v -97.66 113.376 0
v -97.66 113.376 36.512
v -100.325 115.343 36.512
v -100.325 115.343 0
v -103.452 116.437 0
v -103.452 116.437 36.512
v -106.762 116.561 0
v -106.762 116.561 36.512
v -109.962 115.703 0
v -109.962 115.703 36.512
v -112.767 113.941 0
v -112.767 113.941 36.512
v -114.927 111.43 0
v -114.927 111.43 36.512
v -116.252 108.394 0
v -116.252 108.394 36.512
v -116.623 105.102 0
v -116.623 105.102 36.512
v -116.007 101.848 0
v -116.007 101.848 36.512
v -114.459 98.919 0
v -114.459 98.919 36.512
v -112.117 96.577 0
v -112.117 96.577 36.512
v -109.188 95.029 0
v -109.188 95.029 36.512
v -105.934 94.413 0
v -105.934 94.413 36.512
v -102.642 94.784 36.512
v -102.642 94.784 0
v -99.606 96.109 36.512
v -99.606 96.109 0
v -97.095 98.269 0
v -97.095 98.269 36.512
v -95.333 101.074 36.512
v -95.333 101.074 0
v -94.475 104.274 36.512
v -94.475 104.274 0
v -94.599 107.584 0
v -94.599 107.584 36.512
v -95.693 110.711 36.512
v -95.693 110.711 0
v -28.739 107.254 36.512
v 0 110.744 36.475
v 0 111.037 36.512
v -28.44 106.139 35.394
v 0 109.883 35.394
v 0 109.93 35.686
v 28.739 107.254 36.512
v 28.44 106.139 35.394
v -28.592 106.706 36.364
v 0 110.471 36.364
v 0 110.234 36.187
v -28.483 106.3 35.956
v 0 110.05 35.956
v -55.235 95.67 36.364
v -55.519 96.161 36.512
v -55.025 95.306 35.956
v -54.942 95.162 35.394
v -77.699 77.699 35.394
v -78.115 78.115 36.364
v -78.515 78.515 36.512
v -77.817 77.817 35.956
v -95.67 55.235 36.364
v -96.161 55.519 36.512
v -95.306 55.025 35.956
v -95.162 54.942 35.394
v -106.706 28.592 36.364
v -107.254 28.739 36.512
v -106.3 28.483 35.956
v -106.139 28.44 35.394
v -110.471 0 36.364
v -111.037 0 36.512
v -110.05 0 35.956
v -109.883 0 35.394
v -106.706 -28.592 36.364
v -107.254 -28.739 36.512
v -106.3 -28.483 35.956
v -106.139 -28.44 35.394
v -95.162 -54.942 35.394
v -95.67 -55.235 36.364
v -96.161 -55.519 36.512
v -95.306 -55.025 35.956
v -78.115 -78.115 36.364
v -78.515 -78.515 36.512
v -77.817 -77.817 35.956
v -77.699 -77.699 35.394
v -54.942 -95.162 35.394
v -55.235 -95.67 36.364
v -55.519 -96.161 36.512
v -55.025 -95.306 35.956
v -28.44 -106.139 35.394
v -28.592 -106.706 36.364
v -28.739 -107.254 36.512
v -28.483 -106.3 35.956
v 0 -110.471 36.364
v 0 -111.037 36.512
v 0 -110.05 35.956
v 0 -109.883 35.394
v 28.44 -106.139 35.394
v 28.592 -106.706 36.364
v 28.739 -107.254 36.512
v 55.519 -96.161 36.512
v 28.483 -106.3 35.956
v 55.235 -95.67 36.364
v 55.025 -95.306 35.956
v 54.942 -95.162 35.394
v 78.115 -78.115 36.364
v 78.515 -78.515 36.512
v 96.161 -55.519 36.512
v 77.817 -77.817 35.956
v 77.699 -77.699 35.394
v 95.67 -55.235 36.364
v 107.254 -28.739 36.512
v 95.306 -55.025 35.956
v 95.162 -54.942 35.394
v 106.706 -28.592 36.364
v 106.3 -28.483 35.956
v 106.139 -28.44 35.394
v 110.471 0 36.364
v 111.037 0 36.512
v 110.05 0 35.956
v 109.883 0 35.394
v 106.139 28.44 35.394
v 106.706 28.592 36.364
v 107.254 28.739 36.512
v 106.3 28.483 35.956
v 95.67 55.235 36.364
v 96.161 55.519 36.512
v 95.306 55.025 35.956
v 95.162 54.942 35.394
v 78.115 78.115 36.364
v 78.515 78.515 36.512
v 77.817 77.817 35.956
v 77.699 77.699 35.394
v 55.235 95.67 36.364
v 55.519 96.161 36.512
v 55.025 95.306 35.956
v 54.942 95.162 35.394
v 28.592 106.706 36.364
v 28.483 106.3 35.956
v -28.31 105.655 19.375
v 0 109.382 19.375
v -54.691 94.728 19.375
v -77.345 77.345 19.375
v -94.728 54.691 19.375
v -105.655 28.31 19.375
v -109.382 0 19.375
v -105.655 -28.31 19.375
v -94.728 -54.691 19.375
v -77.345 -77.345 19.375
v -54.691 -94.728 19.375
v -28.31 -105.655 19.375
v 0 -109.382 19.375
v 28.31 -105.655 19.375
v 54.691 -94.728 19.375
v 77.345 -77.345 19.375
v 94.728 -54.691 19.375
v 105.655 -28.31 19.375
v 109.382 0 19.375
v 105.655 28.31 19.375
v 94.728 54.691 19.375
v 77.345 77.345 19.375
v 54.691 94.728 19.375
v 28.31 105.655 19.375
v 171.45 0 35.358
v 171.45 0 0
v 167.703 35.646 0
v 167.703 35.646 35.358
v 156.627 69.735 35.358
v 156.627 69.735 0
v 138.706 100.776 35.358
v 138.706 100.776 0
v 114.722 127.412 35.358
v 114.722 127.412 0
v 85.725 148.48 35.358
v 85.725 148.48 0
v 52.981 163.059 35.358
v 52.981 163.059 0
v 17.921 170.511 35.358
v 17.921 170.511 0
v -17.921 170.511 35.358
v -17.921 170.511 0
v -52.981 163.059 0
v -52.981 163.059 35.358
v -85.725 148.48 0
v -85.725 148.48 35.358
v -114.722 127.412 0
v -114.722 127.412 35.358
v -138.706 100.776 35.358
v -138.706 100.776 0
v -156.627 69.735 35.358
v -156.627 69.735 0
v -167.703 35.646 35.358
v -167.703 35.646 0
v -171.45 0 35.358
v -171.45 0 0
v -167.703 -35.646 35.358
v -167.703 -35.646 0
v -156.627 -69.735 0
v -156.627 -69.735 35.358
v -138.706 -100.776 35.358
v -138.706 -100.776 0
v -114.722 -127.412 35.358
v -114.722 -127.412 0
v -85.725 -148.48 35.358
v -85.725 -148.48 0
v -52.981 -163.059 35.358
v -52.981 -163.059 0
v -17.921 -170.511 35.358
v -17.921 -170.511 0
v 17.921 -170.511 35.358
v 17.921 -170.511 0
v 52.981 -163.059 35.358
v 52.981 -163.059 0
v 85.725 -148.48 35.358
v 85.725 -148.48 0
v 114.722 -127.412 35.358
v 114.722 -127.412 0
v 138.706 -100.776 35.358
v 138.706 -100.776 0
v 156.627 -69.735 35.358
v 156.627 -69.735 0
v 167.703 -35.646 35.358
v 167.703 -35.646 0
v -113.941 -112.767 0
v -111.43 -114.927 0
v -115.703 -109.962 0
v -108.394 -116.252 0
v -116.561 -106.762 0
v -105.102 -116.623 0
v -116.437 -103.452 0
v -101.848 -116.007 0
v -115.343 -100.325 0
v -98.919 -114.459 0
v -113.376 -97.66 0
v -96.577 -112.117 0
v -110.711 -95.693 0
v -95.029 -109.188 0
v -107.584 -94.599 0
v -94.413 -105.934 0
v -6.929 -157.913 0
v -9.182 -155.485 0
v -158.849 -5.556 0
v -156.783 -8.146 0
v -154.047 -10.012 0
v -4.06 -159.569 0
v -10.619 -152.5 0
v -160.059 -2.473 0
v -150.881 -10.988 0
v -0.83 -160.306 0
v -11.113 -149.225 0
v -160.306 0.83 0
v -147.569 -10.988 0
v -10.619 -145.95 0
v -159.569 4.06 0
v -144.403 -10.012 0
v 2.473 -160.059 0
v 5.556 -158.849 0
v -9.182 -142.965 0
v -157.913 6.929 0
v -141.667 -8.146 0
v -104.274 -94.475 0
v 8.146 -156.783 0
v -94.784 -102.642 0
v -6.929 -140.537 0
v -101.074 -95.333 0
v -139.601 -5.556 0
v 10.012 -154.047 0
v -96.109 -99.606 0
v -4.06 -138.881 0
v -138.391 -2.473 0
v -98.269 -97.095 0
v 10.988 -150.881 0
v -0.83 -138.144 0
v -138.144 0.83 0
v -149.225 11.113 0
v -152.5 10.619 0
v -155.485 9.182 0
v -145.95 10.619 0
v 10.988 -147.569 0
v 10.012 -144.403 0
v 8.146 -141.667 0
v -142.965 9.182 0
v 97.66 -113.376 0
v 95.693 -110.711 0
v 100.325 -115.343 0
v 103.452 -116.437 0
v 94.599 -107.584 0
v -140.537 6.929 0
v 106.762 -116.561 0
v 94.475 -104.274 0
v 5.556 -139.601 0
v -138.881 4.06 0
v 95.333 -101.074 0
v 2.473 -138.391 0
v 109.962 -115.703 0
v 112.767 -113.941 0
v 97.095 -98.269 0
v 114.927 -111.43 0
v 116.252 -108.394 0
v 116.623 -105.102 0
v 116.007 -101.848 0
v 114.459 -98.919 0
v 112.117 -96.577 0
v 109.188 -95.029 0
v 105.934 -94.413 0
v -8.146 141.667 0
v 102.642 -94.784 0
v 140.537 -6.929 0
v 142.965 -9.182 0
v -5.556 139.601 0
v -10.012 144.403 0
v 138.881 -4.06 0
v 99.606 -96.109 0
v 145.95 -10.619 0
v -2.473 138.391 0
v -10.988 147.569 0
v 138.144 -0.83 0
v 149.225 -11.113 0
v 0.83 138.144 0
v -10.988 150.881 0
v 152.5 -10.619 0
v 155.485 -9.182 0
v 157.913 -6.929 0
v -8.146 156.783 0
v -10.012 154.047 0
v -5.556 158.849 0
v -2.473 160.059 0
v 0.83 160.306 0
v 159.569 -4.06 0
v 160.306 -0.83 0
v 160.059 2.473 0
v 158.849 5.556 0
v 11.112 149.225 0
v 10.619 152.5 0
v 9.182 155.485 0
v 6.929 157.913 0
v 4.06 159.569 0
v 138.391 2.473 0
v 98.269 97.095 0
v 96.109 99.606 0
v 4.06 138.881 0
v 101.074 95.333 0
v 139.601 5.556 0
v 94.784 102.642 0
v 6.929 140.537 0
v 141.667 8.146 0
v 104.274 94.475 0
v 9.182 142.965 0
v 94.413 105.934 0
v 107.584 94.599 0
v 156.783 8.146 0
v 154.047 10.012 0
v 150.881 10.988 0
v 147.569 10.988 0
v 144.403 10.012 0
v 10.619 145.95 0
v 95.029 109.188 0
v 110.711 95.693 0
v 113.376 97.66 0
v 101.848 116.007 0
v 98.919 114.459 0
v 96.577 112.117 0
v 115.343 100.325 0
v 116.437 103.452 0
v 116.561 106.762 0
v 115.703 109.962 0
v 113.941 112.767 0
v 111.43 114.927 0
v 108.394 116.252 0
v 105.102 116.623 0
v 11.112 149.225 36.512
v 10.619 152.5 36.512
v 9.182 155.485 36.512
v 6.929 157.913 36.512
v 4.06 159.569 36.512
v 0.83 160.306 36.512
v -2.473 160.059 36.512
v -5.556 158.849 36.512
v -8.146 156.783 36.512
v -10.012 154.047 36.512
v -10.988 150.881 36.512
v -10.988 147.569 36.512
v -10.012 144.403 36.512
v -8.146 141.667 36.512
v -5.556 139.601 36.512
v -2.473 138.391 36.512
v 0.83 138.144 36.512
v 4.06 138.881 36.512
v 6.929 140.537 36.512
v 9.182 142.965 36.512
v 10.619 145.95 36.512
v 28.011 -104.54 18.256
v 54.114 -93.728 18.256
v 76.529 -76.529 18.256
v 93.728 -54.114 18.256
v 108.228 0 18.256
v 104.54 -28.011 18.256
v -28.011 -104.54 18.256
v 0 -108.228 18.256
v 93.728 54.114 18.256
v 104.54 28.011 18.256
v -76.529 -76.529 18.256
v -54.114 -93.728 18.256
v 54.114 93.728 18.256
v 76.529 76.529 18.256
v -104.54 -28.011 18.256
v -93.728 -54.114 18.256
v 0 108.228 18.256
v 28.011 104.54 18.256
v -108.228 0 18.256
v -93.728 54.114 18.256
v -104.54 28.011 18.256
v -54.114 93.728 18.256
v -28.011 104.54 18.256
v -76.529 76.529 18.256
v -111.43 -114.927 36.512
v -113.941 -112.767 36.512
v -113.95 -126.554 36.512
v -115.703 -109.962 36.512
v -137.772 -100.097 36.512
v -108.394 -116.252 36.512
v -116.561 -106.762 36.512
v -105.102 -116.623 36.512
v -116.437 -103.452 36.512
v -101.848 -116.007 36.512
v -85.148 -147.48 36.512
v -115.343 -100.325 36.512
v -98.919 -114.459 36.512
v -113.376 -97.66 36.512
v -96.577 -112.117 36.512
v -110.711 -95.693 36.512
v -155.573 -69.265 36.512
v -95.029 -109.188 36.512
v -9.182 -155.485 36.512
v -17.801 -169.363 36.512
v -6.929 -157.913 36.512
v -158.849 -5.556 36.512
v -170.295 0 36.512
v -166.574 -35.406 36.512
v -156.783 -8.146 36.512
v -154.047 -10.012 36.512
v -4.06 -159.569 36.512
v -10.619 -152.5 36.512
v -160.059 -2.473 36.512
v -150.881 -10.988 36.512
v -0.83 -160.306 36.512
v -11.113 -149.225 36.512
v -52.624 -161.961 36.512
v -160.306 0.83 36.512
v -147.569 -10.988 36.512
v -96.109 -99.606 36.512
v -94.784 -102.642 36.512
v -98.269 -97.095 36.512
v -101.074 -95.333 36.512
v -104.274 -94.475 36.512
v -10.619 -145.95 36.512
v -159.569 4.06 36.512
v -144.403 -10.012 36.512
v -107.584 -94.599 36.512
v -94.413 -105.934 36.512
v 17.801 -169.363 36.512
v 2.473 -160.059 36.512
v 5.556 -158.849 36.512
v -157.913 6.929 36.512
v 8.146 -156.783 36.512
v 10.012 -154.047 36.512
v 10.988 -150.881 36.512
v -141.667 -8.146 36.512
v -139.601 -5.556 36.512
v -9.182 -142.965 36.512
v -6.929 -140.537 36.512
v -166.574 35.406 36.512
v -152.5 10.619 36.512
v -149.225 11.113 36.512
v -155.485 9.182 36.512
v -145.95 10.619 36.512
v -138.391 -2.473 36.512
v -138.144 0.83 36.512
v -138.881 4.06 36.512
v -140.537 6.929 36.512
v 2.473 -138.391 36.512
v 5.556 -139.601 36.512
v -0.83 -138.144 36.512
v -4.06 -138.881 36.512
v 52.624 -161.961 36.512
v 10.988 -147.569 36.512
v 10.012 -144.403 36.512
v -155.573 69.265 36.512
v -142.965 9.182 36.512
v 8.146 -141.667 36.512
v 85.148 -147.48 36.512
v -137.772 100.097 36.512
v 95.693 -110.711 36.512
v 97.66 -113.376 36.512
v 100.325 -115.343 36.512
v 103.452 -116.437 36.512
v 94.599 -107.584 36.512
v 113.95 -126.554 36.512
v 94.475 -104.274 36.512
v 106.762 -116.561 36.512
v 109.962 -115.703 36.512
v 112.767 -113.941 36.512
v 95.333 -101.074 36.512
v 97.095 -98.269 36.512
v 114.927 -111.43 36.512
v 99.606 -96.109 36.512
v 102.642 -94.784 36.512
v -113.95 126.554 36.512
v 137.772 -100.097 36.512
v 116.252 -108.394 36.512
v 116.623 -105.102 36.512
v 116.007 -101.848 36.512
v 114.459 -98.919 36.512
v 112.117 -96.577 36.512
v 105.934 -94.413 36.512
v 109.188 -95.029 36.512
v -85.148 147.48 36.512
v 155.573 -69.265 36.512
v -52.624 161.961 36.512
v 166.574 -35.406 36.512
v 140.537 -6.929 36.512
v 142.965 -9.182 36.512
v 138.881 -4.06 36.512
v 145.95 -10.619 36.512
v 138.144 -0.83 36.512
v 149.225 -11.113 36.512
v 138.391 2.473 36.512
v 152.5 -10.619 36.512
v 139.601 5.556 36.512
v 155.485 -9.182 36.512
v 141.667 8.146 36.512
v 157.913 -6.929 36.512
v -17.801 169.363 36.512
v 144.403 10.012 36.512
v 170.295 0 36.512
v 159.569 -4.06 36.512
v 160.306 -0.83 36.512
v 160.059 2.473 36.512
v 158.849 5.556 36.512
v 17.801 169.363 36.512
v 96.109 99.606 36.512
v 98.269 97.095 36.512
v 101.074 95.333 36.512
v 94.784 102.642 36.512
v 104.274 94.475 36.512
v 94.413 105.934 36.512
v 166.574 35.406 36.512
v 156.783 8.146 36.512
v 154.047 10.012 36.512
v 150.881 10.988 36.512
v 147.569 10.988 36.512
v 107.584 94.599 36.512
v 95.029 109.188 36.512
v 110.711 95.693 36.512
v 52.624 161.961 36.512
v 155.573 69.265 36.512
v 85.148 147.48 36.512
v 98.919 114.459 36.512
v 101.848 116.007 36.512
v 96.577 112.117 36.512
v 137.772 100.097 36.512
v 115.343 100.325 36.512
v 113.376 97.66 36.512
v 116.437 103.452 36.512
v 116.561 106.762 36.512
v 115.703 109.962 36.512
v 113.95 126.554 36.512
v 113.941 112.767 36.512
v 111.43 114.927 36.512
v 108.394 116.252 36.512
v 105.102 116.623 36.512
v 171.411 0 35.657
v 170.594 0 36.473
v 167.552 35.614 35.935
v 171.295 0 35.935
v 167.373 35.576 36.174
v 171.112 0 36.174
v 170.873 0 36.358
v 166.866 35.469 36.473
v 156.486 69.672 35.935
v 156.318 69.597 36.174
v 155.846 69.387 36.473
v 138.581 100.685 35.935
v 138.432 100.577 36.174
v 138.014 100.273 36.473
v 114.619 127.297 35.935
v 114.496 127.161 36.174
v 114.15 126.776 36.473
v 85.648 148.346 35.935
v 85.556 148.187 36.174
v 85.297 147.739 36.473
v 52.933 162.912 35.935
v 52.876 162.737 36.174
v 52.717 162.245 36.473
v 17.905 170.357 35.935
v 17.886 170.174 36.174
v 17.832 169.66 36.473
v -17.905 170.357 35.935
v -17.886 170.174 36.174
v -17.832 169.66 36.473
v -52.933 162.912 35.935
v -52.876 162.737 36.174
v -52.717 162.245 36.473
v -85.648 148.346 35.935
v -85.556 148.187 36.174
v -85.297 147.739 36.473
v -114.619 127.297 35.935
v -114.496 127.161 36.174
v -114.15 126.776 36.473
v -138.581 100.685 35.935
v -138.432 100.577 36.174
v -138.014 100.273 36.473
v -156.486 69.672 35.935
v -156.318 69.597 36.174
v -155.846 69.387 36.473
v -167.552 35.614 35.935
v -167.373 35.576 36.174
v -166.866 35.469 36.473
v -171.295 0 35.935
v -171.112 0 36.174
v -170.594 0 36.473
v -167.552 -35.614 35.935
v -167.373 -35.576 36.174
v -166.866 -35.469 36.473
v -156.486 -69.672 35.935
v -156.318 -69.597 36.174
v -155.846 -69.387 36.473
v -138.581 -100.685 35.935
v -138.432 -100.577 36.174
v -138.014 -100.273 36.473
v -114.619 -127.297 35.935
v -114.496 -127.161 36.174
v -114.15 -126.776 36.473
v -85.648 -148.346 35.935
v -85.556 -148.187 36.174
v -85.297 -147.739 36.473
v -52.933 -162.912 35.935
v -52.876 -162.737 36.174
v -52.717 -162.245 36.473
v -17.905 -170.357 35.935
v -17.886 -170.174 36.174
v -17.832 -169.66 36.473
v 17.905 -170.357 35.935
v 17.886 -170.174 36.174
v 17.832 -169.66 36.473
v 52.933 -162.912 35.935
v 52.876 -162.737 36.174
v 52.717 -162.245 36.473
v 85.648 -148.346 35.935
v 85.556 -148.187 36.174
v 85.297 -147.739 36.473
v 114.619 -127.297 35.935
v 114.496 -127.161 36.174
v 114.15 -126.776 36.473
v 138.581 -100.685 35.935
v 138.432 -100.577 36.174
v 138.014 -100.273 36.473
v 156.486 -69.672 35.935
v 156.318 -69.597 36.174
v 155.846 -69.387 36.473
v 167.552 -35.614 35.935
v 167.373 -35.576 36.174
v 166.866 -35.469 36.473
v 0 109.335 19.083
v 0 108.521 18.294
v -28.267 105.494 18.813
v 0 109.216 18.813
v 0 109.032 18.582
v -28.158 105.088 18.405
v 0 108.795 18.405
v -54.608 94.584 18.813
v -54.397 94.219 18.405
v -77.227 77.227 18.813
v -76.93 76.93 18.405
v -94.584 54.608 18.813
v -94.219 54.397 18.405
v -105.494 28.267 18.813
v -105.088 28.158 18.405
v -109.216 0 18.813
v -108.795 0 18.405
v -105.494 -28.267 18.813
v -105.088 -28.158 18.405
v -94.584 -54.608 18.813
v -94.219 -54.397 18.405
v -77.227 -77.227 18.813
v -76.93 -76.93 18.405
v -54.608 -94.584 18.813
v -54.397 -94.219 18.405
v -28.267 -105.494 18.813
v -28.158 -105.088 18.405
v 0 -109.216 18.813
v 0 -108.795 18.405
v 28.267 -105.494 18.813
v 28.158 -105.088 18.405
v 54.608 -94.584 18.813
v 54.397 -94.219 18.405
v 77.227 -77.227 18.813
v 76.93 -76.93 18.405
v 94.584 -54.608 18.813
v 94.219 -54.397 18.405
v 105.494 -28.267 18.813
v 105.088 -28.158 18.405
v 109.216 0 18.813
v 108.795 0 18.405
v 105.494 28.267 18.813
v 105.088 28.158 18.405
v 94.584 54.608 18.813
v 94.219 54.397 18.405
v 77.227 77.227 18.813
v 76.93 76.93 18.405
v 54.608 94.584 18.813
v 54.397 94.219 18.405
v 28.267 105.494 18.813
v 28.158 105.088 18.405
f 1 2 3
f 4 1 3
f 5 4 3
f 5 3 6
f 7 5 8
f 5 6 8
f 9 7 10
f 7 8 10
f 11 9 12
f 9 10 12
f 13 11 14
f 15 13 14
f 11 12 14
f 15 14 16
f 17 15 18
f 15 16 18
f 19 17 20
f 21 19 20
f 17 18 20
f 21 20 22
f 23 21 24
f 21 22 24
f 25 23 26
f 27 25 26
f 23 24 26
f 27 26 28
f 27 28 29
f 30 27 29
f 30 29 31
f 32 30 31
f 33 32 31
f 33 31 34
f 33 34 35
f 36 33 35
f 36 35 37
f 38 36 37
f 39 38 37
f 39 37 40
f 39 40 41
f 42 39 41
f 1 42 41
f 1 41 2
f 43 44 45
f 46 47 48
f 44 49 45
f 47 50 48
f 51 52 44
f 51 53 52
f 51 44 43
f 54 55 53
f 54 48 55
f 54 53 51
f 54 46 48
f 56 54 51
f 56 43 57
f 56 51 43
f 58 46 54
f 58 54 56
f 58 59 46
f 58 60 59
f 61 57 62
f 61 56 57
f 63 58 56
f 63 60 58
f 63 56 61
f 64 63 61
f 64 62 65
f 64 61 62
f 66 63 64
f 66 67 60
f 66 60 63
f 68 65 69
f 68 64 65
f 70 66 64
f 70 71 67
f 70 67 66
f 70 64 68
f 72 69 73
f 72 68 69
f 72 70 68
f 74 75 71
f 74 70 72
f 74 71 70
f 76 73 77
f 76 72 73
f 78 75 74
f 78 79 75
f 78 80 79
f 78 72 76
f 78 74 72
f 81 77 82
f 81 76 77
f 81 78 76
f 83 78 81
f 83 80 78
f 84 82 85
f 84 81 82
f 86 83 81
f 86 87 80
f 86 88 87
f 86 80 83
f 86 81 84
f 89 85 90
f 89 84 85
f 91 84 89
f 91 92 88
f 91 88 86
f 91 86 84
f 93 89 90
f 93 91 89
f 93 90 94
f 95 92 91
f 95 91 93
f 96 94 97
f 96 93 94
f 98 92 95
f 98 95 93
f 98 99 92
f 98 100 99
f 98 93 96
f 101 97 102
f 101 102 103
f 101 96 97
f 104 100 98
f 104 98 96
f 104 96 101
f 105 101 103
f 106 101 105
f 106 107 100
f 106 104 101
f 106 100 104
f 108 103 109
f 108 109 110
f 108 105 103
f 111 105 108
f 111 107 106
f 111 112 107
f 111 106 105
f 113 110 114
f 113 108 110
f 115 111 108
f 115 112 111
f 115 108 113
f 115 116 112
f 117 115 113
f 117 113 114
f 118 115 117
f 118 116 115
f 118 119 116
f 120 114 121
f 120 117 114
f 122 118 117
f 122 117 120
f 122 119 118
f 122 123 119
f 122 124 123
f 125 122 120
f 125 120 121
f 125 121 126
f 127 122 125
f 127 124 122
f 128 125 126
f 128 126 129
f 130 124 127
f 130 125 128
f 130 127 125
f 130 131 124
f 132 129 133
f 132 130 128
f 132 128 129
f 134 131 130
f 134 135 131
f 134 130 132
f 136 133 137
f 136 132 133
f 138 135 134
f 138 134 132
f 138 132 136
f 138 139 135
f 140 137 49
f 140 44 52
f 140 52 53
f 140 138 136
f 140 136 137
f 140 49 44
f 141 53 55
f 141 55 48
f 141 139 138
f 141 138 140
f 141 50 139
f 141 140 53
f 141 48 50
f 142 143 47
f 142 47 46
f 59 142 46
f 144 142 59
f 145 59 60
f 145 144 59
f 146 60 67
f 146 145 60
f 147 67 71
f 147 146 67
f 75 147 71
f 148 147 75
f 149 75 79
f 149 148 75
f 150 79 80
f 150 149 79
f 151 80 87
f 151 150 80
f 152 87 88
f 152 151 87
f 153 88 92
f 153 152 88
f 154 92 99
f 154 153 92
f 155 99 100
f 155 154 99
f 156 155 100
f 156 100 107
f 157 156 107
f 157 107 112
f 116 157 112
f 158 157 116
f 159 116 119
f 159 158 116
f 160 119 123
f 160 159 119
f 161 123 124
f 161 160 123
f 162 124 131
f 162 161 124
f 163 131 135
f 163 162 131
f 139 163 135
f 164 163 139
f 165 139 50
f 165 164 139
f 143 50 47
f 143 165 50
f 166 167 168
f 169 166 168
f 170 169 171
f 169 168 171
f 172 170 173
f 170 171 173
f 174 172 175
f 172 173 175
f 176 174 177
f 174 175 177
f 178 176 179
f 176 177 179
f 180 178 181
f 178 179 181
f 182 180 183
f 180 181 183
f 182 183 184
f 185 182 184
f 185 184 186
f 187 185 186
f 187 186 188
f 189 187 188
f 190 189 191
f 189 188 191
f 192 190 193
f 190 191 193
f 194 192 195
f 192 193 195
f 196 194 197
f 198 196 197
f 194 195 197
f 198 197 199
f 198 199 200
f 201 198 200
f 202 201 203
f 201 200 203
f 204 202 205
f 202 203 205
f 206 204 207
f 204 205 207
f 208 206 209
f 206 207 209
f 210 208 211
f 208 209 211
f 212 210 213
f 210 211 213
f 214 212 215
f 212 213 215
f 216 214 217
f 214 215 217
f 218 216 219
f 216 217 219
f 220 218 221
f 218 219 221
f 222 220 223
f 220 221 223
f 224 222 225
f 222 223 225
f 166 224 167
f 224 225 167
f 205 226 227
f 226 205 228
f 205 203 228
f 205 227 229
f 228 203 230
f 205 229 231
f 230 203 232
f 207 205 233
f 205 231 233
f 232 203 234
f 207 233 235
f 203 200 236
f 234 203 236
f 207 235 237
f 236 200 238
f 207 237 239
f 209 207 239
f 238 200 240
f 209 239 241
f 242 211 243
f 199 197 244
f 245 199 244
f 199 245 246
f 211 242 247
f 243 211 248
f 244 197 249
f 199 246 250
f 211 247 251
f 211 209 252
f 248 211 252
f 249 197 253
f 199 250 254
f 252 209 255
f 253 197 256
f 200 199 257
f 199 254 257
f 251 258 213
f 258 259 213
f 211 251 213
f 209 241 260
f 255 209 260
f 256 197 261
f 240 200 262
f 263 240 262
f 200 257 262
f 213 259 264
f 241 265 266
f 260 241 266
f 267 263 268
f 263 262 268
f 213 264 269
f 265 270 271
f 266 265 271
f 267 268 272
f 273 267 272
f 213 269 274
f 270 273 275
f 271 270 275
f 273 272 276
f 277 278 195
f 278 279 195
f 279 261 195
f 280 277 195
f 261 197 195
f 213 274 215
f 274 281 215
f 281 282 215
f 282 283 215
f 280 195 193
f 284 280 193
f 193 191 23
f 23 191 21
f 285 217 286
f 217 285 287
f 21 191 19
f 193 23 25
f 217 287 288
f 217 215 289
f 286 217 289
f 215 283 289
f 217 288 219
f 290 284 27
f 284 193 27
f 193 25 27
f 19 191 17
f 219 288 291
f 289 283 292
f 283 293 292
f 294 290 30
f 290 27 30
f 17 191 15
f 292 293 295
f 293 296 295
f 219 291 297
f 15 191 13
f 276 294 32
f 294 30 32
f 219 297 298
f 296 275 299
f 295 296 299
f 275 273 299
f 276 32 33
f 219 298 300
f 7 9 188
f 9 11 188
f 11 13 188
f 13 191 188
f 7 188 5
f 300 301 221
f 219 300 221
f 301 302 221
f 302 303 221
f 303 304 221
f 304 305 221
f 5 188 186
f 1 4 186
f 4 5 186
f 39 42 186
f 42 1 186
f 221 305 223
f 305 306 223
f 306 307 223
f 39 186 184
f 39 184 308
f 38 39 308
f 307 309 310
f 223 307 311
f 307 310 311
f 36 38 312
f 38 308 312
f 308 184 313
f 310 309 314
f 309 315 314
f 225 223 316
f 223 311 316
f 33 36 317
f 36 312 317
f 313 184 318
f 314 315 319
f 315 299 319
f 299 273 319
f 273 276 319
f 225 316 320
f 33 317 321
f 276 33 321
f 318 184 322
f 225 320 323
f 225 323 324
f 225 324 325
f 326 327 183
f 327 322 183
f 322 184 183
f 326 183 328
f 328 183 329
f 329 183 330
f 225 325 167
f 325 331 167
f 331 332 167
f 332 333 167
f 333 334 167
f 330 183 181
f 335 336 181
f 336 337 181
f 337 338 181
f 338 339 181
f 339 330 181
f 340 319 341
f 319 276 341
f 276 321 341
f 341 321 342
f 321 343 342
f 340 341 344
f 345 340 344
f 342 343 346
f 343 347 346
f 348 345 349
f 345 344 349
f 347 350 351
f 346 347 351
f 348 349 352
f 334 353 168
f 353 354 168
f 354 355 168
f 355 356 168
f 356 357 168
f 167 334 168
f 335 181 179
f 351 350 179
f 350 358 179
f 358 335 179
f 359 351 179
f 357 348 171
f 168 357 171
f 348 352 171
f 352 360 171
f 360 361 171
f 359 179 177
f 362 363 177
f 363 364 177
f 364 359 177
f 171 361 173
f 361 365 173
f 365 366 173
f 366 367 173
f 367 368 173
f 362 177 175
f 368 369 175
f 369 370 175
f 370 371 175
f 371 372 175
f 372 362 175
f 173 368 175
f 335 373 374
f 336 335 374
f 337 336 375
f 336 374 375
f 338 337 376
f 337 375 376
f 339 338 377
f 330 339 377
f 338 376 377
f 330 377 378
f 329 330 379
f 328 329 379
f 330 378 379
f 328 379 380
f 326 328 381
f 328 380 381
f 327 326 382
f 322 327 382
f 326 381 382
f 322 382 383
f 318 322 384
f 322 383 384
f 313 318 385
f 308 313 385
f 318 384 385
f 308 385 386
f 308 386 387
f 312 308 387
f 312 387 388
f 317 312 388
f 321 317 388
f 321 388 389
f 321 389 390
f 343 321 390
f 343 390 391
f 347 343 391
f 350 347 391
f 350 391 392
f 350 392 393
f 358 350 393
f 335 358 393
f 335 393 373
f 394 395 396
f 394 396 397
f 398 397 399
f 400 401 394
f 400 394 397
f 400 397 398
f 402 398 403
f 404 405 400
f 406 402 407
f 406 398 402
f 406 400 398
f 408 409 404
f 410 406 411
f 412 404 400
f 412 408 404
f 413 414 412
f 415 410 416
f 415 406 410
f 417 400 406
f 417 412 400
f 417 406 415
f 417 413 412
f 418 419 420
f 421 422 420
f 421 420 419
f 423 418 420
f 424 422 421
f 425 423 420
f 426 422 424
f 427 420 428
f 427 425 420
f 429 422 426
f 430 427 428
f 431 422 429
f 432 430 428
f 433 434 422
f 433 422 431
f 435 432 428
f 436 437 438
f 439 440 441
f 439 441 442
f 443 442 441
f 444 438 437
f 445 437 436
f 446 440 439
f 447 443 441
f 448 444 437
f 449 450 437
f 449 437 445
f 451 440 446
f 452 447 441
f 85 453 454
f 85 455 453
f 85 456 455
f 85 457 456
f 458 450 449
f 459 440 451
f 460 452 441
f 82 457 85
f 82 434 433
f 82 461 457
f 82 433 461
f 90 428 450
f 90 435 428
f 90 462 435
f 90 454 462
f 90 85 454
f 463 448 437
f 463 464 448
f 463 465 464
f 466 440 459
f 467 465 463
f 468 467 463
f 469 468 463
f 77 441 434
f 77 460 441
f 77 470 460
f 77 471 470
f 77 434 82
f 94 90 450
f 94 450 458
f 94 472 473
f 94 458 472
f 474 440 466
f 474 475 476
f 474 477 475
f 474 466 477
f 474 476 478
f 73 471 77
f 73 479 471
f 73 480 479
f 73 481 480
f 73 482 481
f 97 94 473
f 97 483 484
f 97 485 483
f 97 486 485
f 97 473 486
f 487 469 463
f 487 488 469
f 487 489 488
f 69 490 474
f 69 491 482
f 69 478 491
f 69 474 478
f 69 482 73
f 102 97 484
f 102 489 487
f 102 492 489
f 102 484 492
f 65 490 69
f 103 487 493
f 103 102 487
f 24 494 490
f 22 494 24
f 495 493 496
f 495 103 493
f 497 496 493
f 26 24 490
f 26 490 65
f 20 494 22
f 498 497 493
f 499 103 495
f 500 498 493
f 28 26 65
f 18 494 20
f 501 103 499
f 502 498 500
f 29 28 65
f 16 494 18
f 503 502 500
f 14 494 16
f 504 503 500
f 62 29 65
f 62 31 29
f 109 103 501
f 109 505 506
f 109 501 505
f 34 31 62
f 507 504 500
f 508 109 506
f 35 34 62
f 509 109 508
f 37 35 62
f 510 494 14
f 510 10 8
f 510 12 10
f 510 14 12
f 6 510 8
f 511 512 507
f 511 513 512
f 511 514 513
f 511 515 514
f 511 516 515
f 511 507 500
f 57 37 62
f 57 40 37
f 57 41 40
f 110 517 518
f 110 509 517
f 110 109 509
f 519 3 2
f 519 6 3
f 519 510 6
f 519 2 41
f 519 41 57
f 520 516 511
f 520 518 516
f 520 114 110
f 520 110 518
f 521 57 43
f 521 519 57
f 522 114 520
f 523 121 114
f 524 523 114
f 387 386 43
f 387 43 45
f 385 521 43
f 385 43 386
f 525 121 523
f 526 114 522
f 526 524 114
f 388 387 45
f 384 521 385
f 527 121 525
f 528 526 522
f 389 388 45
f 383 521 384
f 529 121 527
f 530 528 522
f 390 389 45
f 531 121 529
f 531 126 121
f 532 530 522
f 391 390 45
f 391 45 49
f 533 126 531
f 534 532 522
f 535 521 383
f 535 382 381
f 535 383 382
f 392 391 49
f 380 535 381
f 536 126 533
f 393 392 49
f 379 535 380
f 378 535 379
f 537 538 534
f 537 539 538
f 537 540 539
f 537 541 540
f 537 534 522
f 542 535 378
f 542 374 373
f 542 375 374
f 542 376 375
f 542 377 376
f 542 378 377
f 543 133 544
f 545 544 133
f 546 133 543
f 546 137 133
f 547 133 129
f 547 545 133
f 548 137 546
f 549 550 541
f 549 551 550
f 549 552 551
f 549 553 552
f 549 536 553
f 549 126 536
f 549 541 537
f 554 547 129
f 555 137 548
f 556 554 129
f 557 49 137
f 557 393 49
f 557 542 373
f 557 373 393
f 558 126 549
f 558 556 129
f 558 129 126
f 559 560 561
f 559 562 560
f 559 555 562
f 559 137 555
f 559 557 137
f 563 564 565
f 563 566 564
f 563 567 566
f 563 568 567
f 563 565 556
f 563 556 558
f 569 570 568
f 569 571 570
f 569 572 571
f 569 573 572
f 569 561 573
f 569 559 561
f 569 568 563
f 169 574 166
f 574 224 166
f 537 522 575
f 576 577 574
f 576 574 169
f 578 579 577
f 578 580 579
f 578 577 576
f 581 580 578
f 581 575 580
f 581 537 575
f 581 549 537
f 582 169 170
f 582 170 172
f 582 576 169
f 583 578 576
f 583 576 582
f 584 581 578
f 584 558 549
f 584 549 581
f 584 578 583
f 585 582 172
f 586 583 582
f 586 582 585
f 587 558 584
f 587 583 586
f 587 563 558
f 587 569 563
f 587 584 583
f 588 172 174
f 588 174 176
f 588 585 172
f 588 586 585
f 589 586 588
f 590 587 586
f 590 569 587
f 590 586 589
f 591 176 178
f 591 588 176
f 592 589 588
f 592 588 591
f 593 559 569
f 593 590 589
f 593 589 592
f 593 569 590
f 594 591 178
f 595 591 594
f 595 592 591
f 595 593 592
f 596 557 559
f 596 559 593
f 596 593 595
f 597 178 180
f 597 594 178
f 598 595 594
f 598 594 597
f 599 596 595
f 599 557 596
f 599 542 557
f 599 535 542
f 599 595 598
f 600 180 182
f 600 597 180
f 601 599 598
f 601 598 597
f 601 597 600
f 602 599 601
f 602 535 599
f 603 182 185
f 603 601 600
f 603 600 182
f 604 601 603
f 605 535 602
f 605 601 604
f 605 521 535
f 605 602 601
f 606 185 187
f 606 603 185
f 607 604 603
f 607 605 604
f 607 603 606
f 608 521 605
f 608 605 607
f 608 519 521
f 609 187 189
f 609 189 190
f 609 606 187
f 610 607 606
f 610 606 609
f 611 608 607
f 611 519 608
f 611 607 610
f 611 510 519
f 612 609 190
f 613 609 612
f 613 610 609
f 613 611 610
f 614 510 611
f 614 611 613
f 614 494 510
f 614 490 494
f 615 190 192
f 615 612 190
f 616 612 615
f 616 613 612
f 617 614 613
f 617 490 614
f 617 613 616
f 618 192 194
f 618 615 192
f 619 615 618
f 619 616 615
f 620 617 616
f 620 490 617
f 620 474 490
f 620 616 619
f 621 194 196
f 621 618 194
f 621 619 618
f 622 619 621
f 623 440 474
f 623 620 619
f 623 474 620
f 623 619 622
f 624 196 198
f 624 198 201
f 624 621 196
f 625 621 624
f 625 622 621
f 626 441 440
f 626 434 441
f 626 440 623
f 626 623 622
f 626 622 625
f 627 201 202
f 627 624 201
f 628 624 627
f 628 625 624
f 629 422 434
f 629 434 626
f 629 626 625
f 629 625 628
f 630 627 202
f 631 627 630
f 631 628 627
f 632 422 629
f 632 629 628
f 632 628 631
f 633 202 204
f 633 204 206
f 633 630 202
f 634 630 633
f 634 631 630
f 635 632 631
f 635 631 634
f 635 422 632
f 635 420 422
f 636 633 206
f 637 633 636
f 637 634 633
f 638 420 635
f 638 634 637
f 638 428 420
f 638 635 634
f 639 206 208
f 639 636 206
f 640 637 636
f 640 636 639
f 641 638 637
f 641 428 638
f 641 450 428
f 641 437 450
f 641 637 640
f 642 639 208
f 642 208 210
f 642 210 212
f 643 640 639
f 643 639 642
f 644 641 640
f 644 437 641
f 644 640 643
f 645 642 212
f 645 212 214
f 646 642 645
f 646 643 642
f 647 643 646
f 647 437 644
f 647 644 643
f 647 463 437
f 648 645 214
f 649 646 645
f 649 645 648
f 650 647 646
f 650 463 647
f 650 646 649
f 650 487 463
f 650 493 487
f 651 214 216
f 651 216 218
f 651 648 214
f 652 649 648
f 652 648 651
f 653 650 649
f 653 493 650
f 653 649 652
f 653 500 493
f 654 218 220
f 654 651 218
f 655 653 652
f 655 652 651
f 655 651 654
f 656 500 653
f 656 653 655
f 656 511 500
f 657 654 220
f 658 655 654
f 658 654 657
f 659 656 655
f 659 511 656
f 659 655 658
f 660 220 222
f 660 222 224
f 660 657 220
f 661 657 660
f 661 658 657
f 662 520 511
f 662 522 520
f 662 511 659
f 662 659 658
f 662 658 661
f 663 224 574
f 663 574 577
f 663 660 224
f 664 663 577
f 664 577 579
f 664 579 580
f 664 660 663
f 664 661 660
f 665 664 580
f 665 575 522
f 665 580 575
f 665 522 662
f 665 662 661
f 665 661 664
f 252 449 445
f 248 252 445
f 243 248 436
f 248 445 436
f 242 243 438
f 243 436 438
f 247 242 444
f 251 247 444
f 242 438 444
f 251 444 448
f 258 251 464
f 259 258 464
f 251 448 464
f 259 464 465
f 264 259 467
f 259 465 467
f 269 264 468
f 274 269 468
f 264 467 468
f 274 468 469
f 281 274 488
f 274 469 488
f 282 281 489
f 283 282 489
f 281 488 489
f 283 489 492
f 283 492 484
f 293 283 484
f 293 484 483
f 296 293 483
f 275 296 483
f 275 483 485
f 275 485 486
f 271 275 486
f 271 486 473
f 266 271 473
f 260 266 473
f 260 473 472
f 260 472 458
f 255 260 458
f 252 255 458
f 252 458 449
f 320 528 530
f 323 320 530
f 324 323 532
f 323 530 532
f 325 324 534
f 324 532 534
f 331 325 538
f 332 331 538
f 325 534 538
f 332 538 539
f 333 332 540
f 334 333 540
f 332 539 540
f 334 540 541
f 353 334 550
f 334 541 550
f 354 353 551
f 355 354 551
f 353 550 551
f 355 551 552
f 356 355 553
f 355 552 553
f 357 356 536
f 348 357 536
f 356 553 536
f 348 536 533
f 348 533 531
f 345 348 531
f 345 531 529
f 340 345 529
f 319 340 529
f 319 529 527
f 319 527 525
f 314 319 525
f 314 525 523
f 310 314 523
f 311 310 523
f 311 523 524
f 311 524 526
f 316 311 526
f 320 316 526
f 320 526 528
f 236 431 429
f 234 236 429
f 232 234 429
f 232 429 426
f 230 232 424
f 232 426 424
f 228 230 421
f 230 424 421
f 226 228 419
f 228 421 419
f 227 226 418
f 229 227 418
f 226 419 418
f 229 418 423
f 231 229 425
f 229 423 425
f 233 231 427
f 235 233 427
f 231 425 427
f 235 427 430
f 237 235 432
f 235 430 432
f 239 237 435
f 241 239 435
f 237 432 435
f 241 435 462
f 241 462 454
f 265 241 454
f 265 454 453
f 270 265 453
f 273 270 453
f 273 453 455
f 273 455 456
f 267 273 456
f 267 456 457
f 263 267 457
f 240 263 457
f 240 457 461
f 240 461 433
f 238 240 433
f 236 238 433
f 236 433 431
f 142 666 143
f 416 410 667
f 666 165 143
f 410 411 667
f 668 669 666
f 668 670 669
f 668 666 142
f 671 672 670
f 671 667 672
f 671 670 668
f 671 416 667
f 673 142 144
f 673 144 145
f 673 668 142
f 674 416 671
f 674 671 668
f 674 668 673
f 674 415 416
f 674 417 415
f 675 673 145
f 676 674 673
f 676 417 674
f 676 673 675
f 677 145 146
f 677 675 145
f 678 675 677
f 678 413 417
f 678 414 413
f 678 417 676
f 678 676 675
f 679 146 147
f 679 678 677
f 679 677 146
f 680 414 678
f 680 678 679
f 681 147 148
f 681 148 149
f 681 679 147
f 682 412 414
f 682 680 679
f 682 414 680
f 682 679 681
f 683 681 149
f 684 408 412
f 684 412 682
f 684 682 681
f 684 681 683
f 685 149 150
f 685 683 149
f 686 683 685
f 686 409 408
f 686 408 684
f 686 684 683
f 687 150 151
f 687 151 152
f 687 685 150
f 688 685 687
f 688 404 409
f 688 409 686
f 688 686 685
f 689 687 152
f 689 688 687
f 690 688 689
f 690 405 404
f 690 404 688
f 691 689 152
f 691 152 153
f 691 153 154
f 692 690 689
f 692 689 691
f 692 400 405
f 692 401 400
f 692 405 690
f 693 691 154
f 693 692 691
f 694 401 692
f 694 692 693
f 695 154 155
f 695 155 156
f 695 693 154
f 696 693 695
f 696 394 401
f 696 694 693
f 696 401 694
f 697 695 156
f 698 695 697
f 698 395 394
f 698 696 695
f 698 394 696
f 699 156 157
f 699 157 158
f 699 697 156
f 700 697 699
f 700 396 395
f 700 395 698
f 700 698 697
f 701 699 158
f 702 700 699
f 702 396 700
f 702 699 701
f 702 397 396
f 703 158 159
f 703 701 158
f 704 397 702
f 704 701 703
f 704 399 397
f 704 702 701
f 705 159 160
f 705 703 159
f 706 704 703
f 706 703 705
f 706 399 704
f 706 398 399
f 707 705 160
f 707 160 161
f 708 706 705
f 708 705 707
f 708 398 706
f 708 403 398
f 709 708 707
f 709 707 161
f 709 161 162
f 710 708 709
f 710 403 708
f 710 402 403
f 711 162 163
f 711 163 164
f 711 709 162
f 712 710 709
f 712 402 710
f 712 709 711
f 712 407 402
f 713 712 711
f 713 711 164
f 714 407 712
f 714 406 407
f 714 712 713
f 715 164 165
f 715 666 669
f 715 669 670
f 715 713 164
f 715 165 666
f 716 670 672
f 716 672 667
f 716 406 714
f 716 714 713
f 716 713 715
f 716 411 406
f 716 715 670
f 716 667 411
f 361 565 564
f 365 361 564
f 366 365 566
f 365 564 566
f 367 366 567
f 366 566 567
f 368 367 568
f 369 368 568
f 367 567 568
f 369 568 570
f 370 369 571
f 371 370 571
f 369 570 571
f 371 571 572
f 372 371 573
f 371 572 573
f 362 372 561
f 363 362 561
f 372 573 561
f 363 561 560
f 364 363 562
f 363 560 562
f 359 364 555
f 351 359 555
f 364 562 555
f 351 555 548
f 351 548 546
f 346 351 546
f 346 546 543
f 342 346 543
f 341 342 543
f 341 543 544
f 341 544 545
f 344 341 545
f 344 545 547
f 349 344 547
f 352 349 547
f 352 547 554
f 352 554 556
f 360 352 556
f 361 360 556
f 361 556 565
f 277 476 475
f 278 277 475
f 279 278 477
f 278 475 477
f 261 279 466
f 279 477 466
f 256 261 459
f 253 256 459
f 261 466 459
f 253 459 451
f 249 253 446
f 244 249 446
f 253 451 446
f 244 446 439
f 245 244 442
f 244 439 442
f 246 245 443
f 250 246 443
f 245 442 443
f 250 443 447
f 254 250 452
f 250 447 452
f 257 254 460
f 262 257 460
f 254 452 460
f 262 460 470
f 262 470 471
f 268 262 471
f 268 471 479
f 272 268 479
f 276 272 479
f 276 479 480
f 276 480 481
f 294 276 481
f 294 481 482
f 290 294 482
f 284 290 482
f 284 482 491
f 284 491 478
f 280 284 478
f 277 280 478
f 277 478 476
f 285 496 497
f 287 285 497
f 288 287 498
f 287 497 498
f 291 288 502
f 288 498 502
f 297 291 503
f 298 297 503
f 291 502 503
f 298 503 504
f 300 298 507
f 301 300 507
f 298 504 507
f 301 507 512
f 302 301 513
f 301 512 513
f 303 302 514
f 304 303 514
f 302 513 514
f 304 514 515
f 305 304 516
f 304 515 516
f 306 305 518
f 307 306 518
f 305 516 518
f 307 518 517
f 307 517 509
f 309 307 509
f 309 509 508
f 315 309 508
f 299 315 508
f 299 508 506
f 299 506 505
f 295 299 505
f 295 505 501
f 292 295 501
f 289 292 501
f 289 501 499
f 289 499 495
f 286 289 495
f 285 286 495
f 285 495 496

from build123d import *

# Parameters (mm, degrees)
SKETCH1_R         = 171.45
EXTRUDE1_DEPTH    = 36.5125
SKETCH2_R         = 11.1125
EXTRUDE2_DEPTH    = 246.20066814
CIRPATTERN1_COUNT = 8
FILLET1_R         = 1.154545455


with BuildPart() as part:
    # Sketch1 → Extrude1 (new body)
    with BuildSketch(Plane.XY):
        Circle(SKETCH1_R)
    extrude(amount=EXTRUDE1_DEPTH)

    # Sketch2 → Extrude2 (cut, through all)
    with BuildSketch(Plane.XY.offset(36.5125)):
        with Locations((0, 149.225)):
            Circle(SKETCH2_R)
    extrude2 = extrude(amount=-EXTRUDE2_DEPTH, mode=Mode.SUBTRACT)

    # CirPattern1: Extrude2 ×8 about axis
    cirpattern1_axis = Axis((0, 0, 0), (0, 0, 1))
    for i in range(1, CIRPATTERN1_COUNT):
        add(extrude2.rotate(cirpattern1_axis, i * 360 / CIRPATTERN1_COUNT), mode=Mode.SUBTRACT)

    # Sketch3 → Cut-Revolve1 (revolve, cut)
    with BuildSketch(Plane(origin=(0, 0, 0), x_dir=(0, 0, -1), z_dir=(1, 0, 0))):
        Polygon((-36.5125, 109.9185), (-18.25625, 109.347), (-18.25625, 0), (-36.5125, 0), align=None)
    revolve(axis=Axis((0, 0, 18.25625), (0, 0, 1)), mode=Mode.SUBTRACT)

    # Fillet1
    fillet1_edges = [part.edges().sort_by_distance(p)[0] for p in [
        (0, -109.347, 18.25625),
        (0, -109.9185, 36.5125),
        (-171.45, 0, 36.5125),
    ]]
    fillet(fillet1_edges, radius=FILLET1_R)


solid = part.part
